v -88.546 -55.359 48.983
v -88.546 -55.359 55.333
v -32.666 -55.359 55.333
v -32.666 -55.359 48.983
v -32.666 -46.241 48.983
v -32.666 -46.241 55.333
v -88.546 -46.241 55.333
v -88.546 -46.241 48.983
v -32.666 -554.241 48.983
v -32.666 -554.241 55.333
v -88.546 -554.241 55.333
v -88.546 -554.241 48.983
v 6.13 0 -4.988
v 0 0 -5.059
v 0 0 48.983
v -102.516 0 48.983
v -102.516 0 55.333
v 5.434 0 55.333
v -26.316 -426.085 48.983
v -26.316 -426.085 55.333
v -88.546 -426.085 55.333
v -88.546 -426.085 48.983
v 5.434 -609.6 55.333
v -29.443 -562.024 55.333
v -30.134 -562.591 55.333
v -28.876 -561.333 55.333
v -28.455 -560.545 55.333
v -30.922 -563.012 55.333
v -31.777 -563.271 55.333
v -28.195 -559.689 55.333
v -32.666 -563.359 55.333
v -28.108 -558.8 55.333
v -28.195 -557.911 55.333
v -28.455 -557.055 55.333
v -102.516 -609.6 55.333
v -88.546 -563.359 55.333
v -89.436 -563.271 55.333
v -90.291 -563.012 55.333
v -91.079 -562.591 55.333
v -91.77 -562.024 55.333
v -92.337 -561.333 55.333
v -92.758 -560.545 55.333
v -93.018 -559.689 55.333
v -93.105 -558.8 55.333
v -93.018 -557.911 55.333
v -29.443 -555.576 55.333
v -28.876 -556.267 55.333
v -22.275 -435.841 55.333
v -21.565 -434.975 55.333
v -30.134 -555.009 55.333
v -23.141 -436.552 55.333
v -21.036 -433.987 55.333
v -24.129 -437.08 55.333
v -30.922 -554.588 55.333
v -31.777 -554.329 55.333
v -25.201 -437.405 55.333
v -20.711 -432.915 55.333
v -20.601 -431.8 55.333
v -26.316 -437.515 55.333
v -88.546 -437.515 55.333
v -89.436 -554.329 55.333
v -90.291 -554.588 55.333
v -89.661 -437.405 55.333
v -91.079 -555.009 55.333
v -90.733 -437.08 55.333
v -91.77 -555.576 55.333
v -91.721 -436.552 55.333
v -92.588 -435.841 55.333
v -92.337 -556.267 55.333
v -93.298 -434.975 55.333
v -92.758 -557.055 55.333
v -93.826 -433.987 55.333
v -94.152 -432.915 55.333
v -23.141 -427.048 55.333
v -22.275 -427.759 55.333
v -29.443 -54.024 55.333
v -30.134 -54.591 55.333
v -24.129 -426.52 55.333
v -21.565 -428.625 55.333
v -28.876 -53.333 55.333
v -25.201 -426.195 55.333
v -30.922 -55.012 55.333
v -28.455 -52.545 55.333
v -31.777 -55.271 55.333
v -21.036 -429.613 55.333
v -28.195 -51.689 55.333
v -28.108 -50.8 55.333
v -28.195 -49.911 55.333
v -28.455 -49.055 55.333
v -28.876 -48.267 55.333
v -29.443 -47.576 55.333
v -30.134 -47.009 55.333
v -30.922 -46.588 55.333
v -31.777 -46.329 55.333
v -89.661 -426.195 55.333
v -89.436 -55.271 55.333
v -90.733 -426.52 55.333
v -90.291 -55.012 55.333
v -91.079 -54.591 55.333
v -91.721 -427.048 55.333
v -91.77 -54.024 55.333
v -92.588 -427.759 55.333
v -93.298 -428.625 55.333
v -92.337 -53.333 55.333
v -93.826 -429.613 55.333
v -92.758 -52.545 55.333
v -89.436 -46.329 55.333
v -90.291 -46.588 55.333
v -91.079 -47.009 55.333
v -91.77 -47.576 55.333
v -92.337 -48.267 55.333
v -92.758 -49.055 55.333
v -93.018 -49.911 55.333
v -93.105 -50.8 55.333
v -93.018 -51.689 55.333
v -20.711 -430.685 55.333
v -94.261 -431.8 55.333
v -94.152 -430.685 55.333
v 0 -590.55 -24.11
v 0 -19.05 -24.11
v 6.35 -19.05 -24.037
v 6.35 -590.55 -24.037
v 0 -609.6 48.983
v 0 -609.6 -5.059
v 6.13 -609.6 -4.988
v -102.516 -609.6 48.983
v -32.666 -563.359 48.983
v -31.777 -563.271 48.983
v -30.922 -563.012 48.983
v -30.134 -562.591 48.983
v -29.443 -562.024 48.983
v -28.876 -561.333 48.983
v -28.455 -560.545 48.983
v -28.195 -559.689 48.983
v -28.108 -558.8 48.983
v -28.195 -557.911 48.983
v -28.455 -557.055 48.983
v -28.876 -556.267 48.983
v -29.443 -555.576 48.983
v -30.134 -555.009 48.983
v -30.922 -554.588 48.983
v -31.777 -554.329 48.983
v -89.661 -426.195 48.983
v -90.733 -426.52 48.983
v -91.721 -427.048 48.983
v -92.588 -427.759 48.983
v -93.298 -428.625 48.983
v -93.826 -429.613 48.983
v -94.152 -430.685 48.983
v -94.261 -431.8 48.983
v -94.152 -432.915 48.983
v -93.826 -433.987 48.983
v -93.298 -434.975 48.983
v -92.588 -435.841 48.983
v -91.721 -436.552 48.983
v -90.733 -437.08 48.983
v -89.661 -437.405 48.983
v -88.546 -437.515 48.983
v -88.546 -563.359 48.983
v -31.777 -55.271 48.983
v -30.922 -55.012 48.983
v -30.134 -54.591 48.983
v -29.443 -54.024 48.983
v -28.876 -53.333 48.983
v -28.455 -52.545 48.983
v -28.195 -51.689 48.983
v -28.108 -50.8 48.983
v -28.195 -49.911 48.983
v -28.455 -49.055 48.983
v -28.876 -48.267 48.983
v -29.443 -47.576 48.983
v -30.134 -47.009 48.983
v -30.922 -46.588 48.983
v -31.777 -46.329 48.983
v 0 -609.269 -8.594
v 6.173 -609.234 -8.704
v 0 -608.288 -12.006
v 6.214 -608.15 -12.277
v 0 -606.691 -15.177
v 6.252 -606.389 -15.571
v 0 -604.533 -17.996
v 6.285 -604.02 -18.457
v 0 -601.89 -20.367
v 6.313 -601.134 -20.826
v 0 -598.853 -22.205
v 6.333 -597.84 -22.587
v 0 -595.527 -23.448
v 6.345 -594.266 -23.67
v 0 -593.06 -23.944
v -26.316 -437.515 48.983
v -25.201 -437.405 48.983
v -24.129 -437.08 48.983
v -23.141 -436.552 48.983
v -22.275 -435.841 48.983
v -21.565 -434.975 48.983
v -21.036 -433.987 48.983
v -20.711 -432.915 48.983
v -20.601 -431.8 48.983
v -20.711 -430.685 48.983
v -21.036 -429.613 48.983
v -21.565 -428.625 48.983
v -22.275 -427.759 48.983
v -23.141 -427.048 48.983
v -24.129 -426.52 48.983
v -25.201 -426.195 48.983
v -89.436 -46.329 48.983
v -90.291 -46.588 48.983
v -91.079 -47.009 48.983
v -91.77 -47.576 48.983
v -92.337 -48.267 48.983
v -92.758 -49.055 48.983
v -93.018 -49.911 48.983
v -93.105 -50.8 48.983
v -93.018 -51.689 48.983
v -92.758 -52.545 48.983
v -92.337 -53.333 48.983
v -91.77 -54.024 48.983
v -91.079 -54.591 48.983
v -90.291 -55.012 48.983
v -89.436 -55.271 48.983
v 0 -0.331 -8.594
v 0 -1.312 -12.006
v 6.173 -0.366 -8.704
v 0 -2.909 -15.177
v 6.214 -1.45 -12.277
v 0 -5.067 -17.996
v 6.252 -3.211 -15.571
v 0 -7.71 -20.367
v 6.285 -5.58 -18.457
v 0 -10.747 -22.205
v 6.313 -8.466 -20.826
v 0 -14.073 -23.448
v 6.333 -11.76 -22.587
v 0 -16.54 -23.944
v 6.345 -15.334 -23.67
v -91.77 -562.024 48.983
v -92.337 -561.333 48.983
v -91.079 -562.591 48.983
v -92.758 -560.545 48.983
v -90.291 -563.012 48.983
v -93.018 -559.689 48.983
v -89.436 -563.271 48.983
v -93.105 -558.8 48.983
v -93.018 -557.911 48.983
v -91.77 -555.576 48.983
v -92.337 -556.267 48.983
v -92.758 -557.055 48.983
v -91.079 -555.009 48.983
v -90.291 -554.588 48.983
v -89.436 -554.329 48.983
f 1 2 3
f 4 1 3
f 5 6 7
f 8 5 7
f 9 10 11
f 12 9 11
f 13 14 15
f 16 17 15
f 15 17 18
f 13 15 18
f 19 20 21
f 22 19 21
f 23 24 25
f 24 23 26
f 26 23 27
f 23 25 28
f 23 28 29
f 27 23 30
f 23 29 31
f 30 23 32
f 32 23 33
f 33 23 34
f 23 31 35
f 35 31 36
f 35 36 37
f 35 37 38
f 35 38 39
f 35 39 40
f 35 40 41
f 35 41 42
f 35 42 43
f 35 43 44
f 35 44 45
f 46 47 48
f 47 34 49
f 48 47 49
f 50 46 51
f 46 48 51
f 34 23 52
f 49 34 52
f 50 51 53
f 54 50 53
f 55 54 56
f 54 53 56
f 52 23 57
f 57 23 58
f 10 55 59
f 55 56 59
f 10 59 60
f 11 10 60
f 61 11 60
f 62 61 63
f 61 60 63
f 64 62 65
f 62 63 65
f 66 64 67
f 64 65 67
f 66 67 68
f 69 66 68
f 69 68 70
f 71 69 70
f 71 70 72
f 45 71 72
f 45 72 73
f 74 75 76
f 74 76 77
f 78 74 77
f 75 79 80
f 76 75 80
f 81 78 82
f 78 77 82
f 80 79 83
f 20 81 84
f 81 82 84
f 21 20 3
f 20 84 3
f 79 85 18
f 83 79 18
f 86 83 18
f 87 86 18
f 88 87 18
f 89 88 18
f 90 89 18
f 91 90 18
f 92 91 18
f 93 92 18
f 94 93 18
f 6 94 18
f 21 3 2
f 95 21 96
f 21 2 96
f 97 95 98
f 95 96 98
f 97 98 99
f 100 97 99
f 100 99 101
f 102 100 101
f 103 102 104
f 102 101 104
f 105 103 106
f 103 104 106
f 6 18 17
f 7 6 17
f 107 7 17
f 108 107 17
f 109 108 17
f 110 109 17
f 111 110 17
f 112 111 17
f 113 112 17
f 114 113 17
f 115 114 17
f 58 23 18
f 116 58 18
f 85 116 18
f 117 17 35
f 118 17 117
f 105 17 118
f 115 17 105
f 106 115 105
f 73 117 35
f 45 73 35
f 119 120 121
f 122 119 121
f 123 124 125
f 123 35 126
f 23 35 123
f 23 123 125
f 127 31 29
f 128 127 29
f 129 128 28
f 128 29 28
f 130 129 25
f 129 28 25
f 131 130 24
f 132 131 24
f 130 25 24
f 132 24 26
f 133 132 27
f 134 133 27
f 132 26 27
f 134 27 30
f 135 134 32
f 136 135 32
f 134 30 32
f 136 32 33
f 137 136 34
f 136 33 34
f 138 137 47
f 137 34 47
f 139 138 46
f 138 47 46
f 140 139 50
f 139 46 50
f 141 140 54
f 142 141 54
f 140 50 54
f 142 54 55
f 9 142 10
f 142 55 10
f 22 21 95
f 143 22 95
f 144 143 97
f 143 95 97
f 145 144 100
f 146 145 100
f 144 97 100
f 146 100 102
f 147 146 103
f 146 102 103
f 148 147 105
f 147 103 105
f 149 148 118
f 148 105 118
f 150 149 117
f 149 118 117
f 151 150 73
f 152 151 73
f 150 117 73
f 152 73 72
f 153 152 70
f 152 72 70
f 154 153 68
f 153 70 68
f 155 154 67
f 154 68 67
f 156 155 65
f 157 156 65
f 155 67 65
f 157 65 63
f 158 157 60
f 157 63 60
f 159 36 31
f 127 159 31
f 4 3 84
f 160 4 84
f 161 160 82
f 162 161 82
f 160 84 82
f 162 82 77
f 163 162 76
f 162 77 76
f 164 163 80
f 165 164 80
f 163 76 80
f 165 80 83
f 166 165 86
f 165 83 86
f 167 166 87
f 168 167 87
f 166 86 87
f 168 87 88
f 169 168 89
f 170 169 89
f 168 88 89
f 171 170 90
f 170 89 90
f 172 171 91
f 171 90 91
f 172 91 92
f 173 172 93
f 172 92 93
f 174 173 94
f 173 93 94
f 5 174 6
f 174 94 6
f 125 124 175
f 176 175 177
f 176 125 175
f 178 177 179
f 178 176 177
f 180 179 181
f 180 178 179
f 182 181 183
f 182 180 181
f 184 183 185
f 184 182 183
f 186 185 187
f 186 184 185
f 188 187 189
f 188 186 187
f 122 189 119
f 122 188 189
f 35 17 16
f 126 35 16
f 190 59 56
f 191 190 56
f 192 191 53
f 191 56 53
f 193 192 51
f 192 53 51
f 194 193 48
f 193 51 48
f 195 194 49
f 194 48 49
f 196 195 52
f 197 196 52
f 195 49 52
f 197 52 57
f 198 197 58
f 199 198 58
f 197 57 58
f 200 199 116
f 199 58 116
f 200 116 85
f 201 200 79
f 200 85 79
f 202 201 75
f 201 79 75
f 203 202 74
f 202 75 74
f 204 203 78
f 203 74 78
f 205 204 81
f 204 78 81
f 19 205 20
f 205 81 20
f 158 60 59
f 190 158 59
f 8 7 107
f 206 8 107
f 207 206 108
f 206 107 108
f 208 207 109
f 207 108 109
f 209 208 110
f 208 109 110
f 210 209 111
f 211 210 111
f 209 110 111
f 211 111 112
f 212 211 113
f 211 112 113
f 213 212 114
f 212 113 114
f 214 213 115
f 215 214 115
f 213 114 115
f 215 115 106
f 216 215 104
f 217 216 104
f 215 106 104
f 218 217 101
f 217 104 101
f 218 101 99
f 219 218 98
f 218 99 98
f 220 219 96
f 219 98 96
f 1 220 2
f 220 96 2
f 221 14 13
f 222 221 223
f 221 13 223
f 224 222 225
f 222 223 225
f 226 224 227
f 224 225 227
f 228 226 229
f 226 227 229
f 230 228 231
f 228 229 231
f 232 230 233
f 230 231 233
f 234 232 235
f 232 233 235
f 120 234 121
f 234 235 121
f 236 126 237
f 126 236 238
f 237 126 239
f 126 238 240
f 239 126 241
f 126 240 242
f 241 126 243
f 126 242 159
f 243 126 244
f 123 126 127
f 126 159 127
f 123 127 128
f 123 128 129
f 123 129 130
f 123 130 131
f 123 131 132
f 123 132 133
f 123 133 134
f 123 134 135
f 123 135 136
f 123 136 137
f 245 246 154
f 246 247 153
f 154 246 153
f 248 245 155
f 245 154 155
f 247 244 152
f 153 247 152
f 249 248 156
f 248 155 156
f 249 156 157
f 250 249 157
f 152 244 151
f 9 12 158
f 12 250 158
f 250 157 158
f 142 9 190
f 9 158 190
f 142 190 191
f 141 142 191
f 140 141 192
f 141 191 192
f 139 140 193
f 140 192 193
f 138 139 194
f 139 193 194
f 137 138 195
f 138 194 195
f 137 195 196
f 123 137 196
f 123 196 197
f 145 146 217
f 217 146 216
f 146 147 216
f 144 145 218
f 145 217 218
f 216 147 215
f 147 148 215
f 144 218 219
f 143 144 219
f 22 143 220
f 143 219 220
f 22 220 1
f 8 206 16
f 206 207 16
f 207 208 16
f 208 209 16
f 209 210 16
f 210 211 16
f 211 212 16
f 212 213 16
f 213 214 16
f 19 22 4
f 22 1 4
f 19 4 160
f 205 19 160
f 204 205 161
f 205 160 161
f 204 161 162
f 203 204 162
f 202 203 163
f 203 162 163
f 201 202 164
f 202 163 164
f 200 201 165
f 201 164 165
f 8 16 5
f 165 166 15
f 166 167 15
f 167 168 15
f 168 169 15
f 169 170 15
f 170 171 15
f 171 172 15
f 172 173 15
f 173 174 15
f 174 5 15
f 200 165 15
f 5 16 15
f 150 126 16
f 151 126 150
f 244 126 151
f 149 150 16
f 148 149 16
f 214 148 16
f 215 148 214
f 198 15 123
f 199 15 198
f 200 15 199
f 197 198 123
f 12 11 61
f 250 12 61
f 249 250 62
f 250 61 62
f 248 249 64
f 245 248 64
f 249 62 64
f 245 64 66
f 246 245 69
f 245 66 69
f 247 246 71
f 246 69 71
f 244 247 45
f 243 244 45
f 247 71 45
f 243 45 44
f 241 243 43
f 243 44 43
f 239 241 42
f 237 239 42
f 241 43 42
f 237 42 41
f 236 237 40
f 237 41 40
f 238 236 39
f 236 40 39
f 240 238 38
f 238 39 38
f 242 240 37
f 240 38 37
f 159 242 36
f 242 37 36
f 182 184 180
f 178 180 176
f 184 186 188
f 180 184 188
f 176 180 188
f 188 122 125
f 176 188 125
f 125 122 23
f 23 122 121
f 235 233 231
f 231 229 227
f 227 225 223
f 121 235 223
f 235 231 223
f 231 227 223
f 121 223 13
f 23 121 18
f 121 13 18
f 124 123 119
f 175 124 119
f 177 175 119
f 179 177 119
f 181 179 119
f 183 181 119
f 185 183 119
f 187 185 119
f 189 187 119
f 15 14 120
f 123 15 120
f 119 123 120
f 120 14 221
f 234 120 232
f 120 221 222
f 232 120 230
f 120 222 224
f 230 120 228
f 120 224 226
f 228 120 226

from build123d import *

# Parameters (mm, degrees)
F1_DEPTH = 609.6
F3_DEPTH = 79.443993
F5_DEPTH = 79.443993
F6_R     = 19.05


with BuildPart() as f1:
    # F0 (on Front) → F1 (new body)
    with BuildSketch(Plane.XZ):
        Polygon((5.433592, 55.333211), (-102.516408, 55.333211), (-102.516408, 48.983211), (0, 48.983211), (0, -24.109783), (6.349577, -24.036504), align=None)
    extrude(amount=F1_DEPTH)

    # F2 (on face) → F3 (cut, through all)
    with BuildSketch(Plane.XY.offset(55.333211)):
        with BuildLine():
            Line((-32.666408, -46.241132), (-88.546408, -46.241132))
            ThreePointArc((-88.546408, -46.241132), (-93.105277, -50.8), (-88.546408, -55.358868))
            Line((-88.546408, -55.358868), (-32.666408, -55.358868))
            ThreePointArc((-32.666408, -55.358868), (-28.10754, -50.8), (-32.666408, -46.241132))
        make_face()
        with BuildLine():
            Line((-32.666408, -554.241132), (-88.546408, -554.241132))
            ThreePointArc((-88.546408, -554.241132), (-93.105277, -558.8), (-88.546408, -563.358868))
            Line((-88.546408, -563.358868), (-32.666408, -563.358868))
            ThreePointArc((-32.666408, -563.358868), (-28.10754, -558.8), (-32.666408, -554.241132))
        make_face()
    extrude(amount=-F3_DEPTH, mode=Mode.SUBTRACT)

    # F4 (on face) → F5 (cut, through all)
    with BuildSketch(Plane.XY.offset(55.333211)):
        with BuildLine():
            Line((-26.316408, -426.085), (-88.546408, -426.085))
            ThreePointArc((-88.546408, -426.085), (-94.261408, -431.8), (-88.546408, -437.515))
            Line((-88.546408, -437.515), (-26.316408, -437.515))
            ThreePointArc((-26.316408, -437.515), (-20.601408, -431.8), (-26.316408, -426.085))
        make_face()
    extrude(amount=-F5_DEPTH, mode=Mode.SUBTRACT)

    # F6
    f6_edges = [f1.edges().sort_by_distance(p)[0] for p in [
        (3.174789, -609.6, -24.073143),
        (3.174789, 0, -24.073143),
    ]]
    fillet(f6_edges, radius=F6_R)


solid = f1.part
